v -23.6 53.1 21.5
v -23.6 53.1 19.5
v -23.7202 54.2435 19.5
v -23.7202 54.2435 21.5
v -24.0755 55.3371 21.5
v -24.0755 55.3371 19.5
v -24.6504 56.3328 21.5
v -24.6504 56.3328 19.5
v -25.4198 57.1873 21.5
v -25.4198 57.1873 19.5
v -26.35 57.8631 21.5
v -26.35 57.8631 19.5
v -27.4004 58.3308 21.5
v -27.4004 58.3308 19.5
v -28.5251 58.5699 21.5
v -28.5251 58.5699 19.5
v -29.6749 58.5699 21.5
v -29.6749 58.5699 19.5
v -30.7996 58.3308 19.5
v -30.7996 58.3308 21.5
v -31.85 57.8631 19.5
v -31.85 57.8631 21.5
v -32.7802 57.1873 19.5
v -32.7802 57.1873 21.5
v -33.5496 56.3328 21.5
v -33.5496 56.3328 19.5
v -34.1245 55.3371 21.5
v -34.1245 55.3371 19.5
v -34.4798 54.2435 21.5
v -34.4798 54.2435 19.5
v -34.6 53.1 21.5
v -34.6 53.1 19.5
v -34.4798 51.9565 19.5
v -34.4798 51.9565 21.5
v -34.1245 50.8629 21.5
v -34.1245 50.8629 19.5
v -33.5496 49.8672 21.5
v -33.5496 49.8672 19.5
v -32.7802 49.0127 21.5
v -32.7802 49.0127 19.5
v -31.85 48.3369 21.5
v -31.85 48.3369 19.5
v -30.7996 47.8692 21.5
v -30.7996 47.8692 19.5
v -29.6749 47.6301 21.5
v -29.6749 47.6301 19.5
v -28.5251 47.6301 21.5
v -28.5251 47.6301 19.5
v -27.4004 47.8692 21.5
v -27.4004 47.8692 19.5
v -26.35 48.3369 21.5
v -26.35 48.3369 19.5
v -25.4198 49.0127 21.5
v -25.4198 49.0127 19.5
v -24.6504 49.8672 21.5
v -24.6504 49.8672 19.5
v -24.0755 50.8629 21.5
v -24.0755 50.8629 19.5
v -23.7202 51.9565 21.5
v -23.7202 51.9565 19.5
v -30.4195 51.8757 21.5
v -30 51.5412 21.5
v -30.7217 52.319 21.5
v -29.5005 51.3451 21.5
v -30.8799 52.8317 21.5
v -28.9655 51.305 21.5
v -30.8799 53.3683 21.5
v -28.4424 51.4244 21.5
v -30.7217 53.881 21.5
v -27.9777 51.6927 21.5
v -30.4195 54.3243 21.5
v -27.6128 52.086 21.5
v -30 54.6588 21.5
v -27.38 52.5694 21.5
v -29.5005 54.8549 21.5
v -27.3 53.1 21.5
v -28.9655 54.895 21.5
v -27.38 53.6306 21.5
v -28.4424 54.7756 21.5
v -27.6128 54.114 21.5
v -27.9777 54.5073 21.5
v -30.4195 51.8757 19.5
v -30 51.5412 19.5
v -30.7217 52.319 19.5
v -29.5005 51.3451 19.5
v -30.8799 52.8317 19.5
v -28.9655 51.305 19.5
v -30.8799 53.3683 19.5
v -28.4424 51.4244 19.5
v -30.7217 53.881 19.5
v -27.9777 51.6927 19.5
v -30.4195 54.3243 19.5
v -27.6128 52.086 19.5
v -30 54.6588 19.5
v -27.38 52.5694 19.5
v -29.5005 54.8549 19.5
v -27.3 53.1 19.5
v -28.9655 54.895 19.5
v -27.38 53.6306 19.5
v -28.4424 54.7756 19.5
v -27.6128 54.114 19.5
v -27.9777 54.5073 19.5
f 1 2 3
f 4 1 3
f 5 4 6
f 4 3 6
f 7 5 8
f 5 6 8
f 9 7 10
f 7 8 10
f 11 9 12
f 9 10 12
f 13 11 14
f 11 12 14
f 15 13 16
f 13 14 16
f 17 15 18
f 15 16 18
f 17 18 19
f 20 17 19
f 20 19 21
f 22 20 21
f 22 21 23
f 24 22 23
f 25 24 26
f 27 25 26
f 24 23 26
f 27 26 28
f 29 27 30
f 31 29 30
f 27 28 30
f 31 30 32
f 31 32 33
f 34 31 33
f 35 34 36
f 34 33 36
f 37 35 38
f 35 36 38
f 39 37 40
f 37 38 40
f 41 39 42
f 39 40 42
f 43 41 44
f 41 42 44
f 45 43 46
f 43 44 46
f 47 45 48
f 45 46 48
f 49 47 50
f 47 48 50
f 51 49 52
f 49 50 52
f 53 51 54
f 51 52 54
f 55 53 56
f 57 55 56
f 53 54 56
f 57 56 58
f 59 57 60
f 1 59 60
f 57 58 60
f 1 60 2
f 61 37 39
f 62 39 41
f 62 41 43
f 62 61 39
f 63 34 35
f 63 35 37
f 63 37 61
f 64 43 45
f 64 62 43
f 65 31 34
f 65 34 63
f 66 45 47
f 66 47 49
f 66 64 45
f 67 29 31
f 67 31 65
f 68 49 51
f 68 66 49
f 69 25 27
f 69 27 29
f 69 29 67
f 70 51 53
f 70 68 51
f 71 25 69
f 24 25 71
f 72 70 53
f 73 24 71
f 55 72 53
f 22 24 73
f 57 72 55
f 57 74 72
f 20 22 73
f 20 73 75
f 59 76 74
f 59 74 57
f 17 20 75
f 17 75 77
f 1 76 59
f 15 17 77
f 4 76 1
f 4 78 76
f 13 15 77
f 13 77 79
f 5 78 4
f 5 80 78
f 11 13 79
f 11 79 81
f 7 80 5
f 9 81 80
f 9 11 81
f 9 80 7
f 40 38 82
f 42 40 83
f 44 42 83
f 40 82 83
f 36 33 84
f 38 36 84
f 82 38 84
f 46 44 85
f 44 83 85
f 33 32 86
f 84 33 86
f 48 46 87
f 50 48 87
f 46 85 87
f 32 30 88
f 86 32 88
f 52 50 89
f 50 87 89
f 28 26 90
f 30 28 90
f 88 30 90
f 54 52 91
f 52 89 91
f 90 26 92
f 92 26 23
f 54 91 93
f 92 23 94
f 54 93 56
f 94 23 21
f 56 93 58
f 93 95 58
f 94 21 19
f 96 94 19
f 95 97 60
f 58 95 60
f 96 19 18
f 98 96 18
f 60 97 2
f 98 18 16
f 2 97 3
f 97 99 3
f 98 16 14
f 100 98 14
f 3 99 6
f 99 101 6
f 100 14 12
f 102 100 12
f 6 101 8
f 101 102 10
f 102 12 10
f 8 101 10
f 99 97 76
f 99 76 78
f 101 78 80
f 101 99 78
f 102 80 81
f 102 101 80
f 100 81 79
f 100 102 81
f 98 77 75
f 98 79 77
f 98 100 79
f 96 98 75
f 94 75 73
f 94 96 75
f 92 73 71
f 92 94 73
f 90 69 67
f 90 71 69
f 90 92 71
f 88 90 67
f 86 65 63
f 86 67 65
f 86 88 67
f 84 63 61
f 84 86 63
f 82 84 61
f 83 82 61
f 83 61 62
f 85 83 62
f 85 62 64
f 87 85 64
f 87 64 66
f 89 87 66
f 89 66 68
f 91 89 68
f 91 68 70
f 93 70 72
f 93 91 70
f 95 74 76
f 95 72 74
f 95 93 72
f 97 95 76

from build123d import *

# Parameters (mm, degrees)
CYLINDER013_R     = 1.8
CYLINDER013_DEPTH = 5
CYLINDER012_R     = 5.5
CYLINDER012_DEPTH = 2


with BuildPart() as vaciado_tope006:
    # Cylinder013 → Cylinder013 (new body)
    with BuildSketch(Plane(origin=(-29.1, 53.1, 24.6), x_dir=(1, 0, 0), z_dir=(0, 0, 1))):
        Circle(CYLINDER013_R)
    extrude(amount=CYLINDER013_DEPTH)


with BuildPart() as arandela_2mm:
    # Cylinder012 → Cylinder012 (new body)
    with BuildSketch(Plane(origin=(-29.1, 53.1, 25.2), x_dir=(1, 0, 0), z_dir=(0, 0, 1))):
        Circle(CYLINDER012_R)
    extrude(amount=CYLINDER012_DEPTH)

    # Cut006: cut vaciado tope006
    add(vaciado_tope006.part, mode=Mode.SUBTRACT)


with BuildPart() as arandela_2mm_1:
    # Cut006 placement: moved
    add(arandela_2mm.part.moved(Location((0, 0, -5.7))))


solid = arandela_2mm_1.part
